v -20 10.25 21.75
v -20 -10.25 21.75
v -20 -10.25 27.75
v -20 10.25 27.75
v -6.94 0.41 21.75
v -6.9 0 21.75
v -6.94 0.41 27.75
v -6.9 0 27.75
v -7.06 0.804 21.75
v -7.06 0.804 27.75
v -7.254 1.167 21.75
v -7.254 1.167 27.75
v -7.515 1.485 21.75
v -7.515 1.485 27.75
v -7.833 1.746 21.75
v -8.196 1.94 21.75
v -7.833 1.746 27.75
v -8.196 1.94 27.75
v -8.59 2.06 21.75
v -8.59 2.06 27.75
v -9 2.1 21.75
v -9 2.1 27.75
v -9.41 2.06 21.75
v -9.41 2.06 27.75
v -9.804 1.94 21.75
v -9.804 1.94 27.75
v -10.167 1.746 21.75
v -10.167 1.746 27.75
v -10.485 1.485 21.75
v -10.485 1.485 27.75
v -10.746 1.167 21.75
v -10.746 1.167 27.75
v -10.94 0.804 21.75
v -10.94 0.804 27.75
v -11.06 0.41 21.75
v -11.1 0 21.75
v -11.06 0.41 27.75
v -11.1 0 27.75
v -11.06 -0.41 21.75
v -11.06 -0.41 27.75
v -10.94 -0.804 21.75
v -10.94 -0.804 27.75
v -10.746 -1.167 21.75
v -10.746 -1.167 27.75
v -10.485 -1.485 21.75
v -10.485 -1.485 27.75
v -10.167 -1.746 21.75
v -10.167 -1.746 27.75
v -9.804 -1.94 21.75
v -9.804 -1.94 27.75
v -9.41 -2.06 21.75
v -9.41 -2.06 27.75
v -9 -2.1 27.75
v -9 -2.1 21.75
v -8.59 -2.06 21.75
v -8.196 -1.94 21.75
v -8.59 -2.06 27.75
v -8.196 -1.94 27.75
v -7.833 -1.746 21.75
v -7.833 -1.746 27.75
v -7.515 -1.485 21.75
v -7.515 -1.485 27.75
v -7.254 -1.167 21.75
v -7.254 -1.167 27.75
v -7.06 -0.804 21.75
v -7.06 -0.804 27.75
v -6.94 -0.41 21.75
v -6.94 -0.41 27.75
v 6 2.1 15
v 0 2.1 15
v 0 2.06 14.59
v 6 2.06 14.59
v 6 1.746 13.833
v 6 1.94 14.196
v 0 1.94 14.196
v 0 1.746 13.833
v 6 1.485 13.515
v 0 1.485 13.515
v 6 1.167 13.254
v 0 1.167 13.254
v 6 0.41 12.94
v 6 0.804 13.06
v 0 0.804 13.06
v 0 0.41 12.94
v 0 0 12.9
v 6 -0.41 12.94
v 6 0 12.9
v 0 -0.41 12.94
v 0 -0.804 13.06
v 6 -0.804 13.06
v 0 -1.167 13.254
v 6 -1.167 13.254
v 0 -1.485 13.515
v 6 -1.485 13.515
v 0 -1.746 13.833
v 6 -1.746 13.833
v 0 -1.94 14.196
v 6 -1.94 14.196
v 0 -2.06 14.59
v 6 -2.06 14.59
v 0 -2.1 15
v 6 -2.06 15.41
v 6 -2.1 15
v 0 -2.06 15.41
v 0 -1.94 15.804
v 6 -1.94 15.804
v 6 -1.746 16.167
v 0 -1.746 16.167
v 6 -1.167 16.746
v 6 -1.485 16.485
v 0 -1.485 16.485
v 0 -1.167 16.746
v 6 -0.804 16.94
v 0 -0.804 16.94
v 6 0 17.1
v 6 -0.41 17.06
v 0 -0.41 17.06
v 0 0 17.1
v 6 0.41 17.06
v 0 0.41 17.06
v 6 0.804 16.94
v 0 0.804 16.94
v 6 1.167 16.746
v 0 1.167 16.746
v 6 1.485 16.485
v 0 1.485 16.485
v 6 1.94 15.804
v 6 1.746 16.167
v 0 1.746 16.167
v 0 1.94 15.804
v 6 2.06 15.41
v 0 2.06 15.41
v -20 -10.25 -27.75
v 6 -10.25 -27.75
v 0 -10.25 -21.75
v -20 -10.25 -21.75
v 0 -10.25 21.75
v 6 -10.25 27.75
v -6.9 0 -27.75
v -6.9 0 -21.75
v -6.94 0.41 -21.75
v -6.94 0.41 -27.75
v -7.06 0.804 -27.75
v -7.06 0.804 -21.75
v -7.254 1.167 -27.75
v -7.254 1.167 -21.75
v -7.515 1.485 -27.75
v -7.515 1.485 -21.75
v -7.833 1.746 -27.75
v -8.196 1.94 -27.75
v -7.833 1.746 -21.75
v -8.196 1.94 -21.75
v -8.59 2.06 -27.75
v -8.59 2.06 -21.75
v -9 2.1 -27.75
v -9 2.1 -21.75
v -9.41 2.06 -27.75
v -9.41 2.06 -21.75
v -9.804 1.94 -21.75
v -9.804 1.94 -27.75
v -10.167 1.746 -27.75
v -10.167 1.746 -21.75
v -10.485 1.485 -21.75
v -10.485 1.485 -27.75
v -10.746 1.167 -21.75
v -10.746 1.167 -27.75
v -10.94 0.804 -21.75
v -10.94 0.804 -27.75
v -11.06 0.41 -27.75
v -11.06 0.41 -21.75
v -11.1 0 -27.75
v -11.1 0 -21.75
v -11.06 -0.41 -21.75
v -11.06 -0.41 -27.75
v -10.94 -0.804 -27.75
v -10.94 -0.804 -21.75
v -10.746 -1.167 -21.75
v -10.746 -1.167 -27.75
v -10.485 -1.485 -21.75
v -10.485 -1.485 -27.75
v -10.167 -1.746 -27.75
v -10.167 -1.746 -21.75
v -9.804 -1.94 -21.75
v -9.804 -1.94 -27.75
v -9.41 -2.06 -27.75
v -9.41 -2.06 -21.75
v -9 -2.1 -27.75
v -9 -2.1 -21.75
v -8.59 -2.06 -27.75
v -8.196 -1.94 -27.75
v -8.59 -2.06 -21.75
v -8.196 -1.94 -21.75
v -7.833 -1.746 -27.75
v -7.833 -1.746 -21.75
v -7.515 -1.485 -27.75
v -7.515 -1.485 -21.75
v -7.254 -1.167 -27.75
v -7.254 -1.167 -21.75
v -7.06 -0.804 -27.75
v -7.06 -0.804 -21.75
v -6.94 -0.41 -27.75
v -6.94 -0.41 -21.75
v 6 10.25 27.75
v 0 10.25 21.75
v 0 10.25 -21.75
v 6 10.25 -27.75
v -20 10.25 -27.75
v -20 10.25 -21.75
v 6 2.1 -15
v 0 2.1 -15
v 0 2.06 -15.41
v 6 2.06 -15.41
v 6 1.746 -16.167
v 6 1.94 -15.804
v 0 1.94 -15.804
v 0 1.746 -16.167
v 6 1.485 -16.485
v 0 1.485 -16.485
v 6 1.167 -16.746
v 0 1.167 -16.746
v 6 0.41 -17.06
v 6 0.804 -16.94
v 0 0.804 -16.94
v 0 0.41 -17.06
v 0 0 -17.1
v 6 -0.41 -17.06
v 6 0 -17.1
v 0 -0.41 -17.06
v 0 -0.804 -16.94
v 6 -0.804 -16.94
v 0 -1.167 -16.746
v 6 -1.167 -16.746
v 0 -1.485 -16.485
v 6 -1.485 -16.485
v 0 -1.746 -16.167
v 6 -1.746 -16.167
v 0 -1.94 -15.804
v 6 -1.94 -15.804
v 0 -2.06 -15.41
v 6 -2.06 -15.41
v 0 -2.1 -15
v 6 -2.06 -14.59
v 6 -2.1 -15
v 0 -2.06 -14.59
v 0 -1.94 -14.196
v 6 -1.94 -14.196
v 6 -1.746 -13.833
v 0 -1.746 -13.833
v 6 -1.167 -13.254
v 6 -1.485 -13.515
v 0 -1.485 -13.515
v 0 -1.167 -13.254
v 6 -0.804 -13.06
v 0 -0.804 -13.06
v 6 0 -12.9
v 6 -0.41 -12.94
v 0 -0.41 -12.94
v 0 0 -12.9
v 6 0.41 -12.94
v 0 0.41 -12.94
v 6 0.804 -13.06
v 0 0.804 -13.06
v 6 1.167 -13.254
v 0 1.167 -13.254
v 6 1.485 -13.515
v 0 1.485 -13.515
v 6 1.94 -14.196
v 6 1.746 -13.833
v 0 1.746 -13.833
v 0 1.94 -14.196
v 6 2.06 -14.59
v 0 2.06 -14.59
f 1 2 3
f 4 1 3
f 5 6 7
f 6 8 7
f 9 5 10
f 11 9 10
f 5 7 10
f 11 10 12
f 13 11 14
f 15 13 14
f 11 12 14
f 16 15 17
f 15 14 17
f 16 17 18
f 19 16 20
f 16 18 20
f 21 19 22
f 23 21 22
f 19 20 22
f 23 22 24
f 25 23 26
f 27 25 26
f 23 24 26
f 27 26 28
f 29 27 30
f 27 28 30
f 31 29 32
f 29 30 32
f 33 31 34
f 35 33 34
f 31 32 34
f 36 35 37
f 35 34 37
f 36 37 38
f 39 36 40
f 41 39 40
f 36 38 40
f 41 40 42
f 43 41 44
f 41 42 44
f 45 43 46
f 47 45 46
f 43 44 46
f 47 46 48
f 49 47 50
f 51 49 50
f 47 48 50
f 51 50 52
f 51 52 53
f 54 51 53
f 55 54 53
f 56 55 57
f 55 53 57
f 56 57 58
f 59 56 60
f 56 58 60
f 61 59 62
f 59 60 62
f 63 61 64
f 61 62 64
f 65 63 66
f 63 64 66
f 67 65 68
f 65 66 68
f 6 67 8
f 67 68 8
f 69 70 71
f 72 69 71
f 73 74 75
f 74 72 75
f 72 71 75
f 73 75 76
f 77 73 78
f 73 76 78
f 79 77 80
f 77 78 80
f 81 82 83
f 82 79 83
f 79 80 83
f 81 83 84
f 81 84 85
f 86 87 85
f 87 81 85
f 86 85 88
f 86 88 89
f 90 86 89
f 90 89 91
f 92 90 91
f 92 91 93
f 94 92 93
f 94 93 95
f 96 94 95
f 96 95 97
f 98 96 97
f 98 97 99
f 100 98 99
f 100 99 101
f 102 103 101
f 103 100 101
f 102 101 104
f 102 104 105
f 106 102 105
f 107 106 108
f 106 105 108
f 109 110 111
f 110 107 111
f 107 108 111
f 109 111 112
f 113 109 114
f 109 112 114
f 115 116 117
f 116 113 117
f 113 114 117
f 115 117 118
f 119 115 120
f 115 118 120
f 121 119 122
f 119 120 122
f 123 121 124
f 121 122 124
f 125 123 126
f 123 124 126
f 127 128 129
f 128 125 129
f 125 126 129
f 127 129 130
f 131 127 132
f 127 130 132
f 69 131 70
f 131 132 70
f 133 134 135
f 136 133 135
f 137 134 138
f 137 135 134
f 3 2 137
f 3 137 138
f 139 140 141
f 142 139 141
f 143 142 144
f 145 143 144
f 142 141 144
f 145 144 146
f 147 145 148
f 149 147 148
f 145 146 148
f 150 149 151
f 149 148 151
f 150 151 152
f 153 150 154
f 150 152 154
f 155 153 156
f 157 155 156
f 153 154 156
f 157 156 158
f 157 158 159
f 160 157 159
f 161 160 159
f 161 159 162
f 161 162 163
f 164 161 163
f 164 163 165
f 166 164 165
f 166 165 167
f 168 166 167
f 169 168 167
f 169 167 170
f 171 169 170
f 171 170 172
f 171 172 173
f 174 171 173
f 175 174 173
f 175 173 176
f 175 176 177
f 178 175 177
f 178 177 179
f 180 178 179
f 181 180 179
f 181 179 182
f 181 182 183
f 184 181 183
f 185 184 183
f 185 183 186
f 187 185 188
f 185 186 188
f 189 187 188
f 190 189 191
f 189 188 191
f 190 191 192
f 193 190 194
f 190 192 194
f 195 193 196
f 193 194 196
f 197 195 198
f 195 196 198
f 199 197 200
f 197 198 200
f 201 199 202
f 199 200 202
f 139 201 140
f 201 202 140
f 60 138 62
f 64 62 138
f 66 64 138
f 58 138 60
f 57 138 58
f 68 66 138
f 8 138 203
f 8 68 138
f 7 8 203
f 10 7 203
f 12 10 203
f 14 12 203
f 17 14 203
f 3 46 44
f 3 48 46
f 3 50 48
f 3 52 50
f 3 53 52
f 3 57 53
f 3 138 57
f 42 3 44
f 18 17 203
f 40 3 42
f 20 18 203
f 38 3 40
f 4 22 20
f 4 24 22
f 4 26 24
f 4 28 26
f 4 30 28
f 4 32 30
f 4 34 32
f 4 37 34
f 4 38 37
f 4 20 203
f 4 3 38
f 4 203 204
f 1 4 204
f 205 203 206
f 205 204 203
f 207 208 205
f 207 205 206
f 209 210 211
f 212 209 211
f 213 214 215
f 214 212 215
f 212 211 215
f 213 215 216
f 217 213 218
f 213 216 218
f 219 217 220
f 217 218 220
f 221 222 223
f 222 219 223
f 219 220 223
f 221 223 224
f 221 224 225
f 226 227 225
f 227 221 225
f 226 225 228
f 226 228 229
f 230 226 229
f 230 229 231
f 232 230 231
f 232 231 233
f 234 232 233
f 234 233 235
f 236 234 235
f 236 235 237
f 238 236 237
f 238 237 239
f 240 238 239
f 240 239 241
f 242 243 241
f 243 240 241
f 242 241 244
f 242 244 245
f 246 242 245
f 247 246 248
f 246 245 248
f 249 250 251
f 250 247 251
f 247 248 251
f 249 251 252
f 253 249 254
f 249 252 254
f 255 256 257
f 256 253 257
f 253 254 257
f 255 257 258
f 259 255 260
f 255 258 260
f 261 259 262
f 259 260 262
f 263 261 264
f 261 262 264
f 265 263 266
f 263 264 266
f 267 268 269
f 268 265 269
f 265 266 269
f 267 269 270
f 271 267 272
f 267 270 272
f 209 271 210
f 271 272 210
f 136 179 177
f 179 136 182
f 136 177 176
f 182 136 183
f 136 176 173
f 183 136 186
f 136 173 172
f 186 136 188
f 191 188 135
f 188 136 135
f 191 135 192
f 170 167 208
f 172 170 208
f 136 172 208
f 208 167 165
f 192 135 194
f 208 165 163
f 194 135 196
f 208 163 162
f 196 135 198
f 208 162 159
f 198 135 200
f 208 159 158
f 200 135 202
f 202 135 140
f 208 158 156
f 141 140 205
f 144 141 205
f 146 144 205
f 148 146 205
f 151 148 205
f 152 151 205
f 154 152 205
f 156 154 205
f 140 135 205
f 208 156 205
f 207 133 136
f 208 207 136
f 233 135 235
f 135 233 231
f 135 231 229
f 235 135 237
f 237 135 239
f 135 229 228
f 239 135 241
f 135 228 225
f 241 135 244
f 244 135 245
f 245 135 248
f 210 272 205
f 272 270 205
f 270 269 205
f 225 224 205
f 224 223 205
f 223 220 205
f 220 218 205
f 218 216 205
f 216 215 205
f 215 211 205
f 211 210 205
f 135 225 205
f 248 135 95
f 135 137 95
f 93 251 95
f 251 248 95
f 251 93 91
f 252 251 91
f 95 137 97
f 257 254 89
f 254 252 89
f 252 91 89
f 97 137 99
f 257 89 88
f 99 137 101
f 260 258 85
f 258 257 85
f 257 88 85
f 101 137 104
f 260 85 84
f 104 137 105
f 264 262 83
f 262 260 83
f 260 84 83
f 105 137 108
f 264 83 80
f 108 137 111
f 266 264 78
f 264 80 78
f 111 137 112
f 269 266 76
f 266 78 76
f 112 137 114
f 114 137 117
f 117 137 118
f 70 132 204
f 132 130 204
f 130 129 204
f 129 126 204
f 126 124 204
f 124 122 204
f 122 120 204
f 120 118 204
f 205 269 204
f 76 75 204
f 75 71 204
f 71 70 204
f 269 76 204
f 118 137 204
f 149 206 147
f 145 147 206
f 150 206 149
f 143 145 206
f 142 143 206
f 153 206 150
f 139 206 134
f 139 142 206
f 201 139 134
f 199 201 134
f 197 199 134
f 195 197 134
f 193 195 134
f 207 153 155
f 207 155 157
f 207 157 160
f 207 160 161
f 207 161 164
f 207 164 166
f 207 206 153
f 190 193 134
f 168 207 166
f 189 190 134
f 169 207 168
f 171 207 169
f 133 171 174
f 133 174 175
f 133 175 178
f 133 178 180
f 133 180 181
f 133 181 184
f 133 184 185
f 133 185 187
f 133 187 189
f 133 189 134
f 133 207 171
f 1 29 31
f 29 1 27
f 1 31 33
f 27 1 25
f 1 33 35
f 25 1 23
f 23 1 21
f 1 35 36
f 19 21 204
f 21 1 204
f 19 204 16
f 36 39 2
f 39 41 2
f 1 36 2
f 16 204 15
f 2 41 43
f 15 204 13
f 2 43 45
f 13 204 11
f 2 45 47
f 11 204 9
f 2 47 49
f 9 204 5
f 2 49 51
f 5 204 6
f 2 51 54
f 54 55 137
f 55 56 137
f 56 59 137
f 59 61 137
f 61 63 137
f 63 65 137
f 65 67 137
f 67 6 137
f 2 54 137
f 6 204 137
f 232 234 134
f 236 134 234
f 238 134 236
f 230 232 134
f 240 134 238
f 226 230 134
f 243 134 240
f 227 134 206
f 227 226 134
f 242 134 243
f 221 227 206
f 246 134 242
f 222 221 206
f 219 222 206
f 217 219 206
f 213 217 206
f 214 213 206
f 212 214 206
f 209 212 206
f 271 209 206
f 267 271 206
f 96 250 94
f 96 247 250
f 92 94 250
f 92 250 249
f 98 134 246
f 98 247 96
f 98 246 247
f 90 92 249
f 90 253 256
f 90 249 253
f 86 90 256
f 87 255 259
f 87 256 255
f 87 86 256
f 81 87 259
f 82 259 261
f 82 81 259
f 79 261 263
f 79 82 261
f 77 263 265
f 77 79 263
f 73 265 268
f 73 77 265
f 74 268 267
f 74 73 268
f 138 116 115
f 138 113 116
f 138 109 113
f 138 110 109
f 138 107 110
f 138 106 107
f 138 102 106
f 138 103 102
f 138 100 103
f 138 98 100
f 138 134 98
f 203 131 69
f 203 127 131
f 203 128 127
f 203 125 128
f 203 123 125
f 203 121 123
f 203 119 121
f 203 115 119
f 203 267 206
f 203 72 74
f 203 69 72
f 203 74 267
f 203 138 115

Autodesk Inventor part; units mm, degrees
ref_plane "YZ Plane" through (0, 0, 0) normal (1, 0, 0) x (0, 1, 0)
ref_plane "XZ Plane" through (0, 0, 0) normal (0, 1, 0) x (-1, 0, 0)
ref_plane "XY Plane" through (0, 0, 0) normal (0, 0, 1) x (1, 0, 0)
sketch "Sketch1" plane through (0, 0, 0) normal (1, 0, 0) x (0, 1, 0)
  line L0 (-10.25, 27.75) -> (10.25, 27.75)
  line L1 (10.25, 27.75) -> (10.25, -27.75)
  line L2 (10.25, -27.75) -> (-10.25, -27.75)
  line L3 (-10.25, -27.75) -> (-10.25, 27.75)
  line L4 (-10.25, 27.75) -> (10.25, -27.75) construction
  line L5 (10.25, 27.75) -> (-10.25, -27.75) construction
  circle A0 centre (0, 15) radius 2.1
  circle A1 centre (0, -15) radius 2.1
  point P0 (0, 0)
  dimension "d0" = 20.5
  dimension "d1" = 55.5
  dimension "d2" = 4.2
  dimension "d3" = 4.2
  dimension "d4" = 30
  dimension "d5" = 10.25
  dimension "d6" = 12.75
  dimension "d7" = 10.25
extrude "Extrusion1" add sketch "Sketch1" along normal blind 6
sketch "Sketch2" plane through (0, 0, 0) normal (-1, 0, 0) x (0, 0, 1)
  line L0 (27.75, -10.25) -> (-27.75, -10.25) projected
  line L1 (-27.75, -10.25) -> (-21.75, -10.25)
  line L2 (-21.75, -10.25) -> (-21.75, 10.25)
  line L3 (-21.75, 10.25) -> (-27.75, 10.25)
  line L4 (-27.75, 10.25) -> (-27.75, -10.25)
  line L5 (-27.75, 10.25) -> (27.75, 10.25) projected
  line L6 (27.75, 10.25) -> (21.75, 10.25)
  line L7 (21.75, 10.25) -> (21.75, -10.25)
  line L8 (21.75, -10.25) -> (27.75, -10.25)
  line L9 (27.75, -10.25) -> (27.75, 10.25)
  point P0 (0, 0)
  dimension "d10" = 6
  dimension "d11" = 20.5
  dimension "d12" = 6
  dimension "d13" = 20.5
extrude "Extrusion2" add sketch "Sketch2" along normal blind 20 contours L0 L7 L5 L9 | L0 L4 L3 L2
sketch "Sketch3" plane through (6, -10.25, 27.75) normal (0, 0, 1) x (1, 0, 0)
  circle A0 centre (-15, 10.25) radius 2.1
  line L0 (0, 20.5) -> (0, 0) projected
  line L1 (-26, 0) -> (0, 0) projected
  point P0 (-6, 10.25)
  dimension "d16" = 4.2
  dimension "d17" = 15
  dimension "d18" = 10.25
extrude "Extrusion3" cut sketch "Sketch3" against normal blind 56.5125
properties part number "Bracket Sides" material "Aluminum 6061"
